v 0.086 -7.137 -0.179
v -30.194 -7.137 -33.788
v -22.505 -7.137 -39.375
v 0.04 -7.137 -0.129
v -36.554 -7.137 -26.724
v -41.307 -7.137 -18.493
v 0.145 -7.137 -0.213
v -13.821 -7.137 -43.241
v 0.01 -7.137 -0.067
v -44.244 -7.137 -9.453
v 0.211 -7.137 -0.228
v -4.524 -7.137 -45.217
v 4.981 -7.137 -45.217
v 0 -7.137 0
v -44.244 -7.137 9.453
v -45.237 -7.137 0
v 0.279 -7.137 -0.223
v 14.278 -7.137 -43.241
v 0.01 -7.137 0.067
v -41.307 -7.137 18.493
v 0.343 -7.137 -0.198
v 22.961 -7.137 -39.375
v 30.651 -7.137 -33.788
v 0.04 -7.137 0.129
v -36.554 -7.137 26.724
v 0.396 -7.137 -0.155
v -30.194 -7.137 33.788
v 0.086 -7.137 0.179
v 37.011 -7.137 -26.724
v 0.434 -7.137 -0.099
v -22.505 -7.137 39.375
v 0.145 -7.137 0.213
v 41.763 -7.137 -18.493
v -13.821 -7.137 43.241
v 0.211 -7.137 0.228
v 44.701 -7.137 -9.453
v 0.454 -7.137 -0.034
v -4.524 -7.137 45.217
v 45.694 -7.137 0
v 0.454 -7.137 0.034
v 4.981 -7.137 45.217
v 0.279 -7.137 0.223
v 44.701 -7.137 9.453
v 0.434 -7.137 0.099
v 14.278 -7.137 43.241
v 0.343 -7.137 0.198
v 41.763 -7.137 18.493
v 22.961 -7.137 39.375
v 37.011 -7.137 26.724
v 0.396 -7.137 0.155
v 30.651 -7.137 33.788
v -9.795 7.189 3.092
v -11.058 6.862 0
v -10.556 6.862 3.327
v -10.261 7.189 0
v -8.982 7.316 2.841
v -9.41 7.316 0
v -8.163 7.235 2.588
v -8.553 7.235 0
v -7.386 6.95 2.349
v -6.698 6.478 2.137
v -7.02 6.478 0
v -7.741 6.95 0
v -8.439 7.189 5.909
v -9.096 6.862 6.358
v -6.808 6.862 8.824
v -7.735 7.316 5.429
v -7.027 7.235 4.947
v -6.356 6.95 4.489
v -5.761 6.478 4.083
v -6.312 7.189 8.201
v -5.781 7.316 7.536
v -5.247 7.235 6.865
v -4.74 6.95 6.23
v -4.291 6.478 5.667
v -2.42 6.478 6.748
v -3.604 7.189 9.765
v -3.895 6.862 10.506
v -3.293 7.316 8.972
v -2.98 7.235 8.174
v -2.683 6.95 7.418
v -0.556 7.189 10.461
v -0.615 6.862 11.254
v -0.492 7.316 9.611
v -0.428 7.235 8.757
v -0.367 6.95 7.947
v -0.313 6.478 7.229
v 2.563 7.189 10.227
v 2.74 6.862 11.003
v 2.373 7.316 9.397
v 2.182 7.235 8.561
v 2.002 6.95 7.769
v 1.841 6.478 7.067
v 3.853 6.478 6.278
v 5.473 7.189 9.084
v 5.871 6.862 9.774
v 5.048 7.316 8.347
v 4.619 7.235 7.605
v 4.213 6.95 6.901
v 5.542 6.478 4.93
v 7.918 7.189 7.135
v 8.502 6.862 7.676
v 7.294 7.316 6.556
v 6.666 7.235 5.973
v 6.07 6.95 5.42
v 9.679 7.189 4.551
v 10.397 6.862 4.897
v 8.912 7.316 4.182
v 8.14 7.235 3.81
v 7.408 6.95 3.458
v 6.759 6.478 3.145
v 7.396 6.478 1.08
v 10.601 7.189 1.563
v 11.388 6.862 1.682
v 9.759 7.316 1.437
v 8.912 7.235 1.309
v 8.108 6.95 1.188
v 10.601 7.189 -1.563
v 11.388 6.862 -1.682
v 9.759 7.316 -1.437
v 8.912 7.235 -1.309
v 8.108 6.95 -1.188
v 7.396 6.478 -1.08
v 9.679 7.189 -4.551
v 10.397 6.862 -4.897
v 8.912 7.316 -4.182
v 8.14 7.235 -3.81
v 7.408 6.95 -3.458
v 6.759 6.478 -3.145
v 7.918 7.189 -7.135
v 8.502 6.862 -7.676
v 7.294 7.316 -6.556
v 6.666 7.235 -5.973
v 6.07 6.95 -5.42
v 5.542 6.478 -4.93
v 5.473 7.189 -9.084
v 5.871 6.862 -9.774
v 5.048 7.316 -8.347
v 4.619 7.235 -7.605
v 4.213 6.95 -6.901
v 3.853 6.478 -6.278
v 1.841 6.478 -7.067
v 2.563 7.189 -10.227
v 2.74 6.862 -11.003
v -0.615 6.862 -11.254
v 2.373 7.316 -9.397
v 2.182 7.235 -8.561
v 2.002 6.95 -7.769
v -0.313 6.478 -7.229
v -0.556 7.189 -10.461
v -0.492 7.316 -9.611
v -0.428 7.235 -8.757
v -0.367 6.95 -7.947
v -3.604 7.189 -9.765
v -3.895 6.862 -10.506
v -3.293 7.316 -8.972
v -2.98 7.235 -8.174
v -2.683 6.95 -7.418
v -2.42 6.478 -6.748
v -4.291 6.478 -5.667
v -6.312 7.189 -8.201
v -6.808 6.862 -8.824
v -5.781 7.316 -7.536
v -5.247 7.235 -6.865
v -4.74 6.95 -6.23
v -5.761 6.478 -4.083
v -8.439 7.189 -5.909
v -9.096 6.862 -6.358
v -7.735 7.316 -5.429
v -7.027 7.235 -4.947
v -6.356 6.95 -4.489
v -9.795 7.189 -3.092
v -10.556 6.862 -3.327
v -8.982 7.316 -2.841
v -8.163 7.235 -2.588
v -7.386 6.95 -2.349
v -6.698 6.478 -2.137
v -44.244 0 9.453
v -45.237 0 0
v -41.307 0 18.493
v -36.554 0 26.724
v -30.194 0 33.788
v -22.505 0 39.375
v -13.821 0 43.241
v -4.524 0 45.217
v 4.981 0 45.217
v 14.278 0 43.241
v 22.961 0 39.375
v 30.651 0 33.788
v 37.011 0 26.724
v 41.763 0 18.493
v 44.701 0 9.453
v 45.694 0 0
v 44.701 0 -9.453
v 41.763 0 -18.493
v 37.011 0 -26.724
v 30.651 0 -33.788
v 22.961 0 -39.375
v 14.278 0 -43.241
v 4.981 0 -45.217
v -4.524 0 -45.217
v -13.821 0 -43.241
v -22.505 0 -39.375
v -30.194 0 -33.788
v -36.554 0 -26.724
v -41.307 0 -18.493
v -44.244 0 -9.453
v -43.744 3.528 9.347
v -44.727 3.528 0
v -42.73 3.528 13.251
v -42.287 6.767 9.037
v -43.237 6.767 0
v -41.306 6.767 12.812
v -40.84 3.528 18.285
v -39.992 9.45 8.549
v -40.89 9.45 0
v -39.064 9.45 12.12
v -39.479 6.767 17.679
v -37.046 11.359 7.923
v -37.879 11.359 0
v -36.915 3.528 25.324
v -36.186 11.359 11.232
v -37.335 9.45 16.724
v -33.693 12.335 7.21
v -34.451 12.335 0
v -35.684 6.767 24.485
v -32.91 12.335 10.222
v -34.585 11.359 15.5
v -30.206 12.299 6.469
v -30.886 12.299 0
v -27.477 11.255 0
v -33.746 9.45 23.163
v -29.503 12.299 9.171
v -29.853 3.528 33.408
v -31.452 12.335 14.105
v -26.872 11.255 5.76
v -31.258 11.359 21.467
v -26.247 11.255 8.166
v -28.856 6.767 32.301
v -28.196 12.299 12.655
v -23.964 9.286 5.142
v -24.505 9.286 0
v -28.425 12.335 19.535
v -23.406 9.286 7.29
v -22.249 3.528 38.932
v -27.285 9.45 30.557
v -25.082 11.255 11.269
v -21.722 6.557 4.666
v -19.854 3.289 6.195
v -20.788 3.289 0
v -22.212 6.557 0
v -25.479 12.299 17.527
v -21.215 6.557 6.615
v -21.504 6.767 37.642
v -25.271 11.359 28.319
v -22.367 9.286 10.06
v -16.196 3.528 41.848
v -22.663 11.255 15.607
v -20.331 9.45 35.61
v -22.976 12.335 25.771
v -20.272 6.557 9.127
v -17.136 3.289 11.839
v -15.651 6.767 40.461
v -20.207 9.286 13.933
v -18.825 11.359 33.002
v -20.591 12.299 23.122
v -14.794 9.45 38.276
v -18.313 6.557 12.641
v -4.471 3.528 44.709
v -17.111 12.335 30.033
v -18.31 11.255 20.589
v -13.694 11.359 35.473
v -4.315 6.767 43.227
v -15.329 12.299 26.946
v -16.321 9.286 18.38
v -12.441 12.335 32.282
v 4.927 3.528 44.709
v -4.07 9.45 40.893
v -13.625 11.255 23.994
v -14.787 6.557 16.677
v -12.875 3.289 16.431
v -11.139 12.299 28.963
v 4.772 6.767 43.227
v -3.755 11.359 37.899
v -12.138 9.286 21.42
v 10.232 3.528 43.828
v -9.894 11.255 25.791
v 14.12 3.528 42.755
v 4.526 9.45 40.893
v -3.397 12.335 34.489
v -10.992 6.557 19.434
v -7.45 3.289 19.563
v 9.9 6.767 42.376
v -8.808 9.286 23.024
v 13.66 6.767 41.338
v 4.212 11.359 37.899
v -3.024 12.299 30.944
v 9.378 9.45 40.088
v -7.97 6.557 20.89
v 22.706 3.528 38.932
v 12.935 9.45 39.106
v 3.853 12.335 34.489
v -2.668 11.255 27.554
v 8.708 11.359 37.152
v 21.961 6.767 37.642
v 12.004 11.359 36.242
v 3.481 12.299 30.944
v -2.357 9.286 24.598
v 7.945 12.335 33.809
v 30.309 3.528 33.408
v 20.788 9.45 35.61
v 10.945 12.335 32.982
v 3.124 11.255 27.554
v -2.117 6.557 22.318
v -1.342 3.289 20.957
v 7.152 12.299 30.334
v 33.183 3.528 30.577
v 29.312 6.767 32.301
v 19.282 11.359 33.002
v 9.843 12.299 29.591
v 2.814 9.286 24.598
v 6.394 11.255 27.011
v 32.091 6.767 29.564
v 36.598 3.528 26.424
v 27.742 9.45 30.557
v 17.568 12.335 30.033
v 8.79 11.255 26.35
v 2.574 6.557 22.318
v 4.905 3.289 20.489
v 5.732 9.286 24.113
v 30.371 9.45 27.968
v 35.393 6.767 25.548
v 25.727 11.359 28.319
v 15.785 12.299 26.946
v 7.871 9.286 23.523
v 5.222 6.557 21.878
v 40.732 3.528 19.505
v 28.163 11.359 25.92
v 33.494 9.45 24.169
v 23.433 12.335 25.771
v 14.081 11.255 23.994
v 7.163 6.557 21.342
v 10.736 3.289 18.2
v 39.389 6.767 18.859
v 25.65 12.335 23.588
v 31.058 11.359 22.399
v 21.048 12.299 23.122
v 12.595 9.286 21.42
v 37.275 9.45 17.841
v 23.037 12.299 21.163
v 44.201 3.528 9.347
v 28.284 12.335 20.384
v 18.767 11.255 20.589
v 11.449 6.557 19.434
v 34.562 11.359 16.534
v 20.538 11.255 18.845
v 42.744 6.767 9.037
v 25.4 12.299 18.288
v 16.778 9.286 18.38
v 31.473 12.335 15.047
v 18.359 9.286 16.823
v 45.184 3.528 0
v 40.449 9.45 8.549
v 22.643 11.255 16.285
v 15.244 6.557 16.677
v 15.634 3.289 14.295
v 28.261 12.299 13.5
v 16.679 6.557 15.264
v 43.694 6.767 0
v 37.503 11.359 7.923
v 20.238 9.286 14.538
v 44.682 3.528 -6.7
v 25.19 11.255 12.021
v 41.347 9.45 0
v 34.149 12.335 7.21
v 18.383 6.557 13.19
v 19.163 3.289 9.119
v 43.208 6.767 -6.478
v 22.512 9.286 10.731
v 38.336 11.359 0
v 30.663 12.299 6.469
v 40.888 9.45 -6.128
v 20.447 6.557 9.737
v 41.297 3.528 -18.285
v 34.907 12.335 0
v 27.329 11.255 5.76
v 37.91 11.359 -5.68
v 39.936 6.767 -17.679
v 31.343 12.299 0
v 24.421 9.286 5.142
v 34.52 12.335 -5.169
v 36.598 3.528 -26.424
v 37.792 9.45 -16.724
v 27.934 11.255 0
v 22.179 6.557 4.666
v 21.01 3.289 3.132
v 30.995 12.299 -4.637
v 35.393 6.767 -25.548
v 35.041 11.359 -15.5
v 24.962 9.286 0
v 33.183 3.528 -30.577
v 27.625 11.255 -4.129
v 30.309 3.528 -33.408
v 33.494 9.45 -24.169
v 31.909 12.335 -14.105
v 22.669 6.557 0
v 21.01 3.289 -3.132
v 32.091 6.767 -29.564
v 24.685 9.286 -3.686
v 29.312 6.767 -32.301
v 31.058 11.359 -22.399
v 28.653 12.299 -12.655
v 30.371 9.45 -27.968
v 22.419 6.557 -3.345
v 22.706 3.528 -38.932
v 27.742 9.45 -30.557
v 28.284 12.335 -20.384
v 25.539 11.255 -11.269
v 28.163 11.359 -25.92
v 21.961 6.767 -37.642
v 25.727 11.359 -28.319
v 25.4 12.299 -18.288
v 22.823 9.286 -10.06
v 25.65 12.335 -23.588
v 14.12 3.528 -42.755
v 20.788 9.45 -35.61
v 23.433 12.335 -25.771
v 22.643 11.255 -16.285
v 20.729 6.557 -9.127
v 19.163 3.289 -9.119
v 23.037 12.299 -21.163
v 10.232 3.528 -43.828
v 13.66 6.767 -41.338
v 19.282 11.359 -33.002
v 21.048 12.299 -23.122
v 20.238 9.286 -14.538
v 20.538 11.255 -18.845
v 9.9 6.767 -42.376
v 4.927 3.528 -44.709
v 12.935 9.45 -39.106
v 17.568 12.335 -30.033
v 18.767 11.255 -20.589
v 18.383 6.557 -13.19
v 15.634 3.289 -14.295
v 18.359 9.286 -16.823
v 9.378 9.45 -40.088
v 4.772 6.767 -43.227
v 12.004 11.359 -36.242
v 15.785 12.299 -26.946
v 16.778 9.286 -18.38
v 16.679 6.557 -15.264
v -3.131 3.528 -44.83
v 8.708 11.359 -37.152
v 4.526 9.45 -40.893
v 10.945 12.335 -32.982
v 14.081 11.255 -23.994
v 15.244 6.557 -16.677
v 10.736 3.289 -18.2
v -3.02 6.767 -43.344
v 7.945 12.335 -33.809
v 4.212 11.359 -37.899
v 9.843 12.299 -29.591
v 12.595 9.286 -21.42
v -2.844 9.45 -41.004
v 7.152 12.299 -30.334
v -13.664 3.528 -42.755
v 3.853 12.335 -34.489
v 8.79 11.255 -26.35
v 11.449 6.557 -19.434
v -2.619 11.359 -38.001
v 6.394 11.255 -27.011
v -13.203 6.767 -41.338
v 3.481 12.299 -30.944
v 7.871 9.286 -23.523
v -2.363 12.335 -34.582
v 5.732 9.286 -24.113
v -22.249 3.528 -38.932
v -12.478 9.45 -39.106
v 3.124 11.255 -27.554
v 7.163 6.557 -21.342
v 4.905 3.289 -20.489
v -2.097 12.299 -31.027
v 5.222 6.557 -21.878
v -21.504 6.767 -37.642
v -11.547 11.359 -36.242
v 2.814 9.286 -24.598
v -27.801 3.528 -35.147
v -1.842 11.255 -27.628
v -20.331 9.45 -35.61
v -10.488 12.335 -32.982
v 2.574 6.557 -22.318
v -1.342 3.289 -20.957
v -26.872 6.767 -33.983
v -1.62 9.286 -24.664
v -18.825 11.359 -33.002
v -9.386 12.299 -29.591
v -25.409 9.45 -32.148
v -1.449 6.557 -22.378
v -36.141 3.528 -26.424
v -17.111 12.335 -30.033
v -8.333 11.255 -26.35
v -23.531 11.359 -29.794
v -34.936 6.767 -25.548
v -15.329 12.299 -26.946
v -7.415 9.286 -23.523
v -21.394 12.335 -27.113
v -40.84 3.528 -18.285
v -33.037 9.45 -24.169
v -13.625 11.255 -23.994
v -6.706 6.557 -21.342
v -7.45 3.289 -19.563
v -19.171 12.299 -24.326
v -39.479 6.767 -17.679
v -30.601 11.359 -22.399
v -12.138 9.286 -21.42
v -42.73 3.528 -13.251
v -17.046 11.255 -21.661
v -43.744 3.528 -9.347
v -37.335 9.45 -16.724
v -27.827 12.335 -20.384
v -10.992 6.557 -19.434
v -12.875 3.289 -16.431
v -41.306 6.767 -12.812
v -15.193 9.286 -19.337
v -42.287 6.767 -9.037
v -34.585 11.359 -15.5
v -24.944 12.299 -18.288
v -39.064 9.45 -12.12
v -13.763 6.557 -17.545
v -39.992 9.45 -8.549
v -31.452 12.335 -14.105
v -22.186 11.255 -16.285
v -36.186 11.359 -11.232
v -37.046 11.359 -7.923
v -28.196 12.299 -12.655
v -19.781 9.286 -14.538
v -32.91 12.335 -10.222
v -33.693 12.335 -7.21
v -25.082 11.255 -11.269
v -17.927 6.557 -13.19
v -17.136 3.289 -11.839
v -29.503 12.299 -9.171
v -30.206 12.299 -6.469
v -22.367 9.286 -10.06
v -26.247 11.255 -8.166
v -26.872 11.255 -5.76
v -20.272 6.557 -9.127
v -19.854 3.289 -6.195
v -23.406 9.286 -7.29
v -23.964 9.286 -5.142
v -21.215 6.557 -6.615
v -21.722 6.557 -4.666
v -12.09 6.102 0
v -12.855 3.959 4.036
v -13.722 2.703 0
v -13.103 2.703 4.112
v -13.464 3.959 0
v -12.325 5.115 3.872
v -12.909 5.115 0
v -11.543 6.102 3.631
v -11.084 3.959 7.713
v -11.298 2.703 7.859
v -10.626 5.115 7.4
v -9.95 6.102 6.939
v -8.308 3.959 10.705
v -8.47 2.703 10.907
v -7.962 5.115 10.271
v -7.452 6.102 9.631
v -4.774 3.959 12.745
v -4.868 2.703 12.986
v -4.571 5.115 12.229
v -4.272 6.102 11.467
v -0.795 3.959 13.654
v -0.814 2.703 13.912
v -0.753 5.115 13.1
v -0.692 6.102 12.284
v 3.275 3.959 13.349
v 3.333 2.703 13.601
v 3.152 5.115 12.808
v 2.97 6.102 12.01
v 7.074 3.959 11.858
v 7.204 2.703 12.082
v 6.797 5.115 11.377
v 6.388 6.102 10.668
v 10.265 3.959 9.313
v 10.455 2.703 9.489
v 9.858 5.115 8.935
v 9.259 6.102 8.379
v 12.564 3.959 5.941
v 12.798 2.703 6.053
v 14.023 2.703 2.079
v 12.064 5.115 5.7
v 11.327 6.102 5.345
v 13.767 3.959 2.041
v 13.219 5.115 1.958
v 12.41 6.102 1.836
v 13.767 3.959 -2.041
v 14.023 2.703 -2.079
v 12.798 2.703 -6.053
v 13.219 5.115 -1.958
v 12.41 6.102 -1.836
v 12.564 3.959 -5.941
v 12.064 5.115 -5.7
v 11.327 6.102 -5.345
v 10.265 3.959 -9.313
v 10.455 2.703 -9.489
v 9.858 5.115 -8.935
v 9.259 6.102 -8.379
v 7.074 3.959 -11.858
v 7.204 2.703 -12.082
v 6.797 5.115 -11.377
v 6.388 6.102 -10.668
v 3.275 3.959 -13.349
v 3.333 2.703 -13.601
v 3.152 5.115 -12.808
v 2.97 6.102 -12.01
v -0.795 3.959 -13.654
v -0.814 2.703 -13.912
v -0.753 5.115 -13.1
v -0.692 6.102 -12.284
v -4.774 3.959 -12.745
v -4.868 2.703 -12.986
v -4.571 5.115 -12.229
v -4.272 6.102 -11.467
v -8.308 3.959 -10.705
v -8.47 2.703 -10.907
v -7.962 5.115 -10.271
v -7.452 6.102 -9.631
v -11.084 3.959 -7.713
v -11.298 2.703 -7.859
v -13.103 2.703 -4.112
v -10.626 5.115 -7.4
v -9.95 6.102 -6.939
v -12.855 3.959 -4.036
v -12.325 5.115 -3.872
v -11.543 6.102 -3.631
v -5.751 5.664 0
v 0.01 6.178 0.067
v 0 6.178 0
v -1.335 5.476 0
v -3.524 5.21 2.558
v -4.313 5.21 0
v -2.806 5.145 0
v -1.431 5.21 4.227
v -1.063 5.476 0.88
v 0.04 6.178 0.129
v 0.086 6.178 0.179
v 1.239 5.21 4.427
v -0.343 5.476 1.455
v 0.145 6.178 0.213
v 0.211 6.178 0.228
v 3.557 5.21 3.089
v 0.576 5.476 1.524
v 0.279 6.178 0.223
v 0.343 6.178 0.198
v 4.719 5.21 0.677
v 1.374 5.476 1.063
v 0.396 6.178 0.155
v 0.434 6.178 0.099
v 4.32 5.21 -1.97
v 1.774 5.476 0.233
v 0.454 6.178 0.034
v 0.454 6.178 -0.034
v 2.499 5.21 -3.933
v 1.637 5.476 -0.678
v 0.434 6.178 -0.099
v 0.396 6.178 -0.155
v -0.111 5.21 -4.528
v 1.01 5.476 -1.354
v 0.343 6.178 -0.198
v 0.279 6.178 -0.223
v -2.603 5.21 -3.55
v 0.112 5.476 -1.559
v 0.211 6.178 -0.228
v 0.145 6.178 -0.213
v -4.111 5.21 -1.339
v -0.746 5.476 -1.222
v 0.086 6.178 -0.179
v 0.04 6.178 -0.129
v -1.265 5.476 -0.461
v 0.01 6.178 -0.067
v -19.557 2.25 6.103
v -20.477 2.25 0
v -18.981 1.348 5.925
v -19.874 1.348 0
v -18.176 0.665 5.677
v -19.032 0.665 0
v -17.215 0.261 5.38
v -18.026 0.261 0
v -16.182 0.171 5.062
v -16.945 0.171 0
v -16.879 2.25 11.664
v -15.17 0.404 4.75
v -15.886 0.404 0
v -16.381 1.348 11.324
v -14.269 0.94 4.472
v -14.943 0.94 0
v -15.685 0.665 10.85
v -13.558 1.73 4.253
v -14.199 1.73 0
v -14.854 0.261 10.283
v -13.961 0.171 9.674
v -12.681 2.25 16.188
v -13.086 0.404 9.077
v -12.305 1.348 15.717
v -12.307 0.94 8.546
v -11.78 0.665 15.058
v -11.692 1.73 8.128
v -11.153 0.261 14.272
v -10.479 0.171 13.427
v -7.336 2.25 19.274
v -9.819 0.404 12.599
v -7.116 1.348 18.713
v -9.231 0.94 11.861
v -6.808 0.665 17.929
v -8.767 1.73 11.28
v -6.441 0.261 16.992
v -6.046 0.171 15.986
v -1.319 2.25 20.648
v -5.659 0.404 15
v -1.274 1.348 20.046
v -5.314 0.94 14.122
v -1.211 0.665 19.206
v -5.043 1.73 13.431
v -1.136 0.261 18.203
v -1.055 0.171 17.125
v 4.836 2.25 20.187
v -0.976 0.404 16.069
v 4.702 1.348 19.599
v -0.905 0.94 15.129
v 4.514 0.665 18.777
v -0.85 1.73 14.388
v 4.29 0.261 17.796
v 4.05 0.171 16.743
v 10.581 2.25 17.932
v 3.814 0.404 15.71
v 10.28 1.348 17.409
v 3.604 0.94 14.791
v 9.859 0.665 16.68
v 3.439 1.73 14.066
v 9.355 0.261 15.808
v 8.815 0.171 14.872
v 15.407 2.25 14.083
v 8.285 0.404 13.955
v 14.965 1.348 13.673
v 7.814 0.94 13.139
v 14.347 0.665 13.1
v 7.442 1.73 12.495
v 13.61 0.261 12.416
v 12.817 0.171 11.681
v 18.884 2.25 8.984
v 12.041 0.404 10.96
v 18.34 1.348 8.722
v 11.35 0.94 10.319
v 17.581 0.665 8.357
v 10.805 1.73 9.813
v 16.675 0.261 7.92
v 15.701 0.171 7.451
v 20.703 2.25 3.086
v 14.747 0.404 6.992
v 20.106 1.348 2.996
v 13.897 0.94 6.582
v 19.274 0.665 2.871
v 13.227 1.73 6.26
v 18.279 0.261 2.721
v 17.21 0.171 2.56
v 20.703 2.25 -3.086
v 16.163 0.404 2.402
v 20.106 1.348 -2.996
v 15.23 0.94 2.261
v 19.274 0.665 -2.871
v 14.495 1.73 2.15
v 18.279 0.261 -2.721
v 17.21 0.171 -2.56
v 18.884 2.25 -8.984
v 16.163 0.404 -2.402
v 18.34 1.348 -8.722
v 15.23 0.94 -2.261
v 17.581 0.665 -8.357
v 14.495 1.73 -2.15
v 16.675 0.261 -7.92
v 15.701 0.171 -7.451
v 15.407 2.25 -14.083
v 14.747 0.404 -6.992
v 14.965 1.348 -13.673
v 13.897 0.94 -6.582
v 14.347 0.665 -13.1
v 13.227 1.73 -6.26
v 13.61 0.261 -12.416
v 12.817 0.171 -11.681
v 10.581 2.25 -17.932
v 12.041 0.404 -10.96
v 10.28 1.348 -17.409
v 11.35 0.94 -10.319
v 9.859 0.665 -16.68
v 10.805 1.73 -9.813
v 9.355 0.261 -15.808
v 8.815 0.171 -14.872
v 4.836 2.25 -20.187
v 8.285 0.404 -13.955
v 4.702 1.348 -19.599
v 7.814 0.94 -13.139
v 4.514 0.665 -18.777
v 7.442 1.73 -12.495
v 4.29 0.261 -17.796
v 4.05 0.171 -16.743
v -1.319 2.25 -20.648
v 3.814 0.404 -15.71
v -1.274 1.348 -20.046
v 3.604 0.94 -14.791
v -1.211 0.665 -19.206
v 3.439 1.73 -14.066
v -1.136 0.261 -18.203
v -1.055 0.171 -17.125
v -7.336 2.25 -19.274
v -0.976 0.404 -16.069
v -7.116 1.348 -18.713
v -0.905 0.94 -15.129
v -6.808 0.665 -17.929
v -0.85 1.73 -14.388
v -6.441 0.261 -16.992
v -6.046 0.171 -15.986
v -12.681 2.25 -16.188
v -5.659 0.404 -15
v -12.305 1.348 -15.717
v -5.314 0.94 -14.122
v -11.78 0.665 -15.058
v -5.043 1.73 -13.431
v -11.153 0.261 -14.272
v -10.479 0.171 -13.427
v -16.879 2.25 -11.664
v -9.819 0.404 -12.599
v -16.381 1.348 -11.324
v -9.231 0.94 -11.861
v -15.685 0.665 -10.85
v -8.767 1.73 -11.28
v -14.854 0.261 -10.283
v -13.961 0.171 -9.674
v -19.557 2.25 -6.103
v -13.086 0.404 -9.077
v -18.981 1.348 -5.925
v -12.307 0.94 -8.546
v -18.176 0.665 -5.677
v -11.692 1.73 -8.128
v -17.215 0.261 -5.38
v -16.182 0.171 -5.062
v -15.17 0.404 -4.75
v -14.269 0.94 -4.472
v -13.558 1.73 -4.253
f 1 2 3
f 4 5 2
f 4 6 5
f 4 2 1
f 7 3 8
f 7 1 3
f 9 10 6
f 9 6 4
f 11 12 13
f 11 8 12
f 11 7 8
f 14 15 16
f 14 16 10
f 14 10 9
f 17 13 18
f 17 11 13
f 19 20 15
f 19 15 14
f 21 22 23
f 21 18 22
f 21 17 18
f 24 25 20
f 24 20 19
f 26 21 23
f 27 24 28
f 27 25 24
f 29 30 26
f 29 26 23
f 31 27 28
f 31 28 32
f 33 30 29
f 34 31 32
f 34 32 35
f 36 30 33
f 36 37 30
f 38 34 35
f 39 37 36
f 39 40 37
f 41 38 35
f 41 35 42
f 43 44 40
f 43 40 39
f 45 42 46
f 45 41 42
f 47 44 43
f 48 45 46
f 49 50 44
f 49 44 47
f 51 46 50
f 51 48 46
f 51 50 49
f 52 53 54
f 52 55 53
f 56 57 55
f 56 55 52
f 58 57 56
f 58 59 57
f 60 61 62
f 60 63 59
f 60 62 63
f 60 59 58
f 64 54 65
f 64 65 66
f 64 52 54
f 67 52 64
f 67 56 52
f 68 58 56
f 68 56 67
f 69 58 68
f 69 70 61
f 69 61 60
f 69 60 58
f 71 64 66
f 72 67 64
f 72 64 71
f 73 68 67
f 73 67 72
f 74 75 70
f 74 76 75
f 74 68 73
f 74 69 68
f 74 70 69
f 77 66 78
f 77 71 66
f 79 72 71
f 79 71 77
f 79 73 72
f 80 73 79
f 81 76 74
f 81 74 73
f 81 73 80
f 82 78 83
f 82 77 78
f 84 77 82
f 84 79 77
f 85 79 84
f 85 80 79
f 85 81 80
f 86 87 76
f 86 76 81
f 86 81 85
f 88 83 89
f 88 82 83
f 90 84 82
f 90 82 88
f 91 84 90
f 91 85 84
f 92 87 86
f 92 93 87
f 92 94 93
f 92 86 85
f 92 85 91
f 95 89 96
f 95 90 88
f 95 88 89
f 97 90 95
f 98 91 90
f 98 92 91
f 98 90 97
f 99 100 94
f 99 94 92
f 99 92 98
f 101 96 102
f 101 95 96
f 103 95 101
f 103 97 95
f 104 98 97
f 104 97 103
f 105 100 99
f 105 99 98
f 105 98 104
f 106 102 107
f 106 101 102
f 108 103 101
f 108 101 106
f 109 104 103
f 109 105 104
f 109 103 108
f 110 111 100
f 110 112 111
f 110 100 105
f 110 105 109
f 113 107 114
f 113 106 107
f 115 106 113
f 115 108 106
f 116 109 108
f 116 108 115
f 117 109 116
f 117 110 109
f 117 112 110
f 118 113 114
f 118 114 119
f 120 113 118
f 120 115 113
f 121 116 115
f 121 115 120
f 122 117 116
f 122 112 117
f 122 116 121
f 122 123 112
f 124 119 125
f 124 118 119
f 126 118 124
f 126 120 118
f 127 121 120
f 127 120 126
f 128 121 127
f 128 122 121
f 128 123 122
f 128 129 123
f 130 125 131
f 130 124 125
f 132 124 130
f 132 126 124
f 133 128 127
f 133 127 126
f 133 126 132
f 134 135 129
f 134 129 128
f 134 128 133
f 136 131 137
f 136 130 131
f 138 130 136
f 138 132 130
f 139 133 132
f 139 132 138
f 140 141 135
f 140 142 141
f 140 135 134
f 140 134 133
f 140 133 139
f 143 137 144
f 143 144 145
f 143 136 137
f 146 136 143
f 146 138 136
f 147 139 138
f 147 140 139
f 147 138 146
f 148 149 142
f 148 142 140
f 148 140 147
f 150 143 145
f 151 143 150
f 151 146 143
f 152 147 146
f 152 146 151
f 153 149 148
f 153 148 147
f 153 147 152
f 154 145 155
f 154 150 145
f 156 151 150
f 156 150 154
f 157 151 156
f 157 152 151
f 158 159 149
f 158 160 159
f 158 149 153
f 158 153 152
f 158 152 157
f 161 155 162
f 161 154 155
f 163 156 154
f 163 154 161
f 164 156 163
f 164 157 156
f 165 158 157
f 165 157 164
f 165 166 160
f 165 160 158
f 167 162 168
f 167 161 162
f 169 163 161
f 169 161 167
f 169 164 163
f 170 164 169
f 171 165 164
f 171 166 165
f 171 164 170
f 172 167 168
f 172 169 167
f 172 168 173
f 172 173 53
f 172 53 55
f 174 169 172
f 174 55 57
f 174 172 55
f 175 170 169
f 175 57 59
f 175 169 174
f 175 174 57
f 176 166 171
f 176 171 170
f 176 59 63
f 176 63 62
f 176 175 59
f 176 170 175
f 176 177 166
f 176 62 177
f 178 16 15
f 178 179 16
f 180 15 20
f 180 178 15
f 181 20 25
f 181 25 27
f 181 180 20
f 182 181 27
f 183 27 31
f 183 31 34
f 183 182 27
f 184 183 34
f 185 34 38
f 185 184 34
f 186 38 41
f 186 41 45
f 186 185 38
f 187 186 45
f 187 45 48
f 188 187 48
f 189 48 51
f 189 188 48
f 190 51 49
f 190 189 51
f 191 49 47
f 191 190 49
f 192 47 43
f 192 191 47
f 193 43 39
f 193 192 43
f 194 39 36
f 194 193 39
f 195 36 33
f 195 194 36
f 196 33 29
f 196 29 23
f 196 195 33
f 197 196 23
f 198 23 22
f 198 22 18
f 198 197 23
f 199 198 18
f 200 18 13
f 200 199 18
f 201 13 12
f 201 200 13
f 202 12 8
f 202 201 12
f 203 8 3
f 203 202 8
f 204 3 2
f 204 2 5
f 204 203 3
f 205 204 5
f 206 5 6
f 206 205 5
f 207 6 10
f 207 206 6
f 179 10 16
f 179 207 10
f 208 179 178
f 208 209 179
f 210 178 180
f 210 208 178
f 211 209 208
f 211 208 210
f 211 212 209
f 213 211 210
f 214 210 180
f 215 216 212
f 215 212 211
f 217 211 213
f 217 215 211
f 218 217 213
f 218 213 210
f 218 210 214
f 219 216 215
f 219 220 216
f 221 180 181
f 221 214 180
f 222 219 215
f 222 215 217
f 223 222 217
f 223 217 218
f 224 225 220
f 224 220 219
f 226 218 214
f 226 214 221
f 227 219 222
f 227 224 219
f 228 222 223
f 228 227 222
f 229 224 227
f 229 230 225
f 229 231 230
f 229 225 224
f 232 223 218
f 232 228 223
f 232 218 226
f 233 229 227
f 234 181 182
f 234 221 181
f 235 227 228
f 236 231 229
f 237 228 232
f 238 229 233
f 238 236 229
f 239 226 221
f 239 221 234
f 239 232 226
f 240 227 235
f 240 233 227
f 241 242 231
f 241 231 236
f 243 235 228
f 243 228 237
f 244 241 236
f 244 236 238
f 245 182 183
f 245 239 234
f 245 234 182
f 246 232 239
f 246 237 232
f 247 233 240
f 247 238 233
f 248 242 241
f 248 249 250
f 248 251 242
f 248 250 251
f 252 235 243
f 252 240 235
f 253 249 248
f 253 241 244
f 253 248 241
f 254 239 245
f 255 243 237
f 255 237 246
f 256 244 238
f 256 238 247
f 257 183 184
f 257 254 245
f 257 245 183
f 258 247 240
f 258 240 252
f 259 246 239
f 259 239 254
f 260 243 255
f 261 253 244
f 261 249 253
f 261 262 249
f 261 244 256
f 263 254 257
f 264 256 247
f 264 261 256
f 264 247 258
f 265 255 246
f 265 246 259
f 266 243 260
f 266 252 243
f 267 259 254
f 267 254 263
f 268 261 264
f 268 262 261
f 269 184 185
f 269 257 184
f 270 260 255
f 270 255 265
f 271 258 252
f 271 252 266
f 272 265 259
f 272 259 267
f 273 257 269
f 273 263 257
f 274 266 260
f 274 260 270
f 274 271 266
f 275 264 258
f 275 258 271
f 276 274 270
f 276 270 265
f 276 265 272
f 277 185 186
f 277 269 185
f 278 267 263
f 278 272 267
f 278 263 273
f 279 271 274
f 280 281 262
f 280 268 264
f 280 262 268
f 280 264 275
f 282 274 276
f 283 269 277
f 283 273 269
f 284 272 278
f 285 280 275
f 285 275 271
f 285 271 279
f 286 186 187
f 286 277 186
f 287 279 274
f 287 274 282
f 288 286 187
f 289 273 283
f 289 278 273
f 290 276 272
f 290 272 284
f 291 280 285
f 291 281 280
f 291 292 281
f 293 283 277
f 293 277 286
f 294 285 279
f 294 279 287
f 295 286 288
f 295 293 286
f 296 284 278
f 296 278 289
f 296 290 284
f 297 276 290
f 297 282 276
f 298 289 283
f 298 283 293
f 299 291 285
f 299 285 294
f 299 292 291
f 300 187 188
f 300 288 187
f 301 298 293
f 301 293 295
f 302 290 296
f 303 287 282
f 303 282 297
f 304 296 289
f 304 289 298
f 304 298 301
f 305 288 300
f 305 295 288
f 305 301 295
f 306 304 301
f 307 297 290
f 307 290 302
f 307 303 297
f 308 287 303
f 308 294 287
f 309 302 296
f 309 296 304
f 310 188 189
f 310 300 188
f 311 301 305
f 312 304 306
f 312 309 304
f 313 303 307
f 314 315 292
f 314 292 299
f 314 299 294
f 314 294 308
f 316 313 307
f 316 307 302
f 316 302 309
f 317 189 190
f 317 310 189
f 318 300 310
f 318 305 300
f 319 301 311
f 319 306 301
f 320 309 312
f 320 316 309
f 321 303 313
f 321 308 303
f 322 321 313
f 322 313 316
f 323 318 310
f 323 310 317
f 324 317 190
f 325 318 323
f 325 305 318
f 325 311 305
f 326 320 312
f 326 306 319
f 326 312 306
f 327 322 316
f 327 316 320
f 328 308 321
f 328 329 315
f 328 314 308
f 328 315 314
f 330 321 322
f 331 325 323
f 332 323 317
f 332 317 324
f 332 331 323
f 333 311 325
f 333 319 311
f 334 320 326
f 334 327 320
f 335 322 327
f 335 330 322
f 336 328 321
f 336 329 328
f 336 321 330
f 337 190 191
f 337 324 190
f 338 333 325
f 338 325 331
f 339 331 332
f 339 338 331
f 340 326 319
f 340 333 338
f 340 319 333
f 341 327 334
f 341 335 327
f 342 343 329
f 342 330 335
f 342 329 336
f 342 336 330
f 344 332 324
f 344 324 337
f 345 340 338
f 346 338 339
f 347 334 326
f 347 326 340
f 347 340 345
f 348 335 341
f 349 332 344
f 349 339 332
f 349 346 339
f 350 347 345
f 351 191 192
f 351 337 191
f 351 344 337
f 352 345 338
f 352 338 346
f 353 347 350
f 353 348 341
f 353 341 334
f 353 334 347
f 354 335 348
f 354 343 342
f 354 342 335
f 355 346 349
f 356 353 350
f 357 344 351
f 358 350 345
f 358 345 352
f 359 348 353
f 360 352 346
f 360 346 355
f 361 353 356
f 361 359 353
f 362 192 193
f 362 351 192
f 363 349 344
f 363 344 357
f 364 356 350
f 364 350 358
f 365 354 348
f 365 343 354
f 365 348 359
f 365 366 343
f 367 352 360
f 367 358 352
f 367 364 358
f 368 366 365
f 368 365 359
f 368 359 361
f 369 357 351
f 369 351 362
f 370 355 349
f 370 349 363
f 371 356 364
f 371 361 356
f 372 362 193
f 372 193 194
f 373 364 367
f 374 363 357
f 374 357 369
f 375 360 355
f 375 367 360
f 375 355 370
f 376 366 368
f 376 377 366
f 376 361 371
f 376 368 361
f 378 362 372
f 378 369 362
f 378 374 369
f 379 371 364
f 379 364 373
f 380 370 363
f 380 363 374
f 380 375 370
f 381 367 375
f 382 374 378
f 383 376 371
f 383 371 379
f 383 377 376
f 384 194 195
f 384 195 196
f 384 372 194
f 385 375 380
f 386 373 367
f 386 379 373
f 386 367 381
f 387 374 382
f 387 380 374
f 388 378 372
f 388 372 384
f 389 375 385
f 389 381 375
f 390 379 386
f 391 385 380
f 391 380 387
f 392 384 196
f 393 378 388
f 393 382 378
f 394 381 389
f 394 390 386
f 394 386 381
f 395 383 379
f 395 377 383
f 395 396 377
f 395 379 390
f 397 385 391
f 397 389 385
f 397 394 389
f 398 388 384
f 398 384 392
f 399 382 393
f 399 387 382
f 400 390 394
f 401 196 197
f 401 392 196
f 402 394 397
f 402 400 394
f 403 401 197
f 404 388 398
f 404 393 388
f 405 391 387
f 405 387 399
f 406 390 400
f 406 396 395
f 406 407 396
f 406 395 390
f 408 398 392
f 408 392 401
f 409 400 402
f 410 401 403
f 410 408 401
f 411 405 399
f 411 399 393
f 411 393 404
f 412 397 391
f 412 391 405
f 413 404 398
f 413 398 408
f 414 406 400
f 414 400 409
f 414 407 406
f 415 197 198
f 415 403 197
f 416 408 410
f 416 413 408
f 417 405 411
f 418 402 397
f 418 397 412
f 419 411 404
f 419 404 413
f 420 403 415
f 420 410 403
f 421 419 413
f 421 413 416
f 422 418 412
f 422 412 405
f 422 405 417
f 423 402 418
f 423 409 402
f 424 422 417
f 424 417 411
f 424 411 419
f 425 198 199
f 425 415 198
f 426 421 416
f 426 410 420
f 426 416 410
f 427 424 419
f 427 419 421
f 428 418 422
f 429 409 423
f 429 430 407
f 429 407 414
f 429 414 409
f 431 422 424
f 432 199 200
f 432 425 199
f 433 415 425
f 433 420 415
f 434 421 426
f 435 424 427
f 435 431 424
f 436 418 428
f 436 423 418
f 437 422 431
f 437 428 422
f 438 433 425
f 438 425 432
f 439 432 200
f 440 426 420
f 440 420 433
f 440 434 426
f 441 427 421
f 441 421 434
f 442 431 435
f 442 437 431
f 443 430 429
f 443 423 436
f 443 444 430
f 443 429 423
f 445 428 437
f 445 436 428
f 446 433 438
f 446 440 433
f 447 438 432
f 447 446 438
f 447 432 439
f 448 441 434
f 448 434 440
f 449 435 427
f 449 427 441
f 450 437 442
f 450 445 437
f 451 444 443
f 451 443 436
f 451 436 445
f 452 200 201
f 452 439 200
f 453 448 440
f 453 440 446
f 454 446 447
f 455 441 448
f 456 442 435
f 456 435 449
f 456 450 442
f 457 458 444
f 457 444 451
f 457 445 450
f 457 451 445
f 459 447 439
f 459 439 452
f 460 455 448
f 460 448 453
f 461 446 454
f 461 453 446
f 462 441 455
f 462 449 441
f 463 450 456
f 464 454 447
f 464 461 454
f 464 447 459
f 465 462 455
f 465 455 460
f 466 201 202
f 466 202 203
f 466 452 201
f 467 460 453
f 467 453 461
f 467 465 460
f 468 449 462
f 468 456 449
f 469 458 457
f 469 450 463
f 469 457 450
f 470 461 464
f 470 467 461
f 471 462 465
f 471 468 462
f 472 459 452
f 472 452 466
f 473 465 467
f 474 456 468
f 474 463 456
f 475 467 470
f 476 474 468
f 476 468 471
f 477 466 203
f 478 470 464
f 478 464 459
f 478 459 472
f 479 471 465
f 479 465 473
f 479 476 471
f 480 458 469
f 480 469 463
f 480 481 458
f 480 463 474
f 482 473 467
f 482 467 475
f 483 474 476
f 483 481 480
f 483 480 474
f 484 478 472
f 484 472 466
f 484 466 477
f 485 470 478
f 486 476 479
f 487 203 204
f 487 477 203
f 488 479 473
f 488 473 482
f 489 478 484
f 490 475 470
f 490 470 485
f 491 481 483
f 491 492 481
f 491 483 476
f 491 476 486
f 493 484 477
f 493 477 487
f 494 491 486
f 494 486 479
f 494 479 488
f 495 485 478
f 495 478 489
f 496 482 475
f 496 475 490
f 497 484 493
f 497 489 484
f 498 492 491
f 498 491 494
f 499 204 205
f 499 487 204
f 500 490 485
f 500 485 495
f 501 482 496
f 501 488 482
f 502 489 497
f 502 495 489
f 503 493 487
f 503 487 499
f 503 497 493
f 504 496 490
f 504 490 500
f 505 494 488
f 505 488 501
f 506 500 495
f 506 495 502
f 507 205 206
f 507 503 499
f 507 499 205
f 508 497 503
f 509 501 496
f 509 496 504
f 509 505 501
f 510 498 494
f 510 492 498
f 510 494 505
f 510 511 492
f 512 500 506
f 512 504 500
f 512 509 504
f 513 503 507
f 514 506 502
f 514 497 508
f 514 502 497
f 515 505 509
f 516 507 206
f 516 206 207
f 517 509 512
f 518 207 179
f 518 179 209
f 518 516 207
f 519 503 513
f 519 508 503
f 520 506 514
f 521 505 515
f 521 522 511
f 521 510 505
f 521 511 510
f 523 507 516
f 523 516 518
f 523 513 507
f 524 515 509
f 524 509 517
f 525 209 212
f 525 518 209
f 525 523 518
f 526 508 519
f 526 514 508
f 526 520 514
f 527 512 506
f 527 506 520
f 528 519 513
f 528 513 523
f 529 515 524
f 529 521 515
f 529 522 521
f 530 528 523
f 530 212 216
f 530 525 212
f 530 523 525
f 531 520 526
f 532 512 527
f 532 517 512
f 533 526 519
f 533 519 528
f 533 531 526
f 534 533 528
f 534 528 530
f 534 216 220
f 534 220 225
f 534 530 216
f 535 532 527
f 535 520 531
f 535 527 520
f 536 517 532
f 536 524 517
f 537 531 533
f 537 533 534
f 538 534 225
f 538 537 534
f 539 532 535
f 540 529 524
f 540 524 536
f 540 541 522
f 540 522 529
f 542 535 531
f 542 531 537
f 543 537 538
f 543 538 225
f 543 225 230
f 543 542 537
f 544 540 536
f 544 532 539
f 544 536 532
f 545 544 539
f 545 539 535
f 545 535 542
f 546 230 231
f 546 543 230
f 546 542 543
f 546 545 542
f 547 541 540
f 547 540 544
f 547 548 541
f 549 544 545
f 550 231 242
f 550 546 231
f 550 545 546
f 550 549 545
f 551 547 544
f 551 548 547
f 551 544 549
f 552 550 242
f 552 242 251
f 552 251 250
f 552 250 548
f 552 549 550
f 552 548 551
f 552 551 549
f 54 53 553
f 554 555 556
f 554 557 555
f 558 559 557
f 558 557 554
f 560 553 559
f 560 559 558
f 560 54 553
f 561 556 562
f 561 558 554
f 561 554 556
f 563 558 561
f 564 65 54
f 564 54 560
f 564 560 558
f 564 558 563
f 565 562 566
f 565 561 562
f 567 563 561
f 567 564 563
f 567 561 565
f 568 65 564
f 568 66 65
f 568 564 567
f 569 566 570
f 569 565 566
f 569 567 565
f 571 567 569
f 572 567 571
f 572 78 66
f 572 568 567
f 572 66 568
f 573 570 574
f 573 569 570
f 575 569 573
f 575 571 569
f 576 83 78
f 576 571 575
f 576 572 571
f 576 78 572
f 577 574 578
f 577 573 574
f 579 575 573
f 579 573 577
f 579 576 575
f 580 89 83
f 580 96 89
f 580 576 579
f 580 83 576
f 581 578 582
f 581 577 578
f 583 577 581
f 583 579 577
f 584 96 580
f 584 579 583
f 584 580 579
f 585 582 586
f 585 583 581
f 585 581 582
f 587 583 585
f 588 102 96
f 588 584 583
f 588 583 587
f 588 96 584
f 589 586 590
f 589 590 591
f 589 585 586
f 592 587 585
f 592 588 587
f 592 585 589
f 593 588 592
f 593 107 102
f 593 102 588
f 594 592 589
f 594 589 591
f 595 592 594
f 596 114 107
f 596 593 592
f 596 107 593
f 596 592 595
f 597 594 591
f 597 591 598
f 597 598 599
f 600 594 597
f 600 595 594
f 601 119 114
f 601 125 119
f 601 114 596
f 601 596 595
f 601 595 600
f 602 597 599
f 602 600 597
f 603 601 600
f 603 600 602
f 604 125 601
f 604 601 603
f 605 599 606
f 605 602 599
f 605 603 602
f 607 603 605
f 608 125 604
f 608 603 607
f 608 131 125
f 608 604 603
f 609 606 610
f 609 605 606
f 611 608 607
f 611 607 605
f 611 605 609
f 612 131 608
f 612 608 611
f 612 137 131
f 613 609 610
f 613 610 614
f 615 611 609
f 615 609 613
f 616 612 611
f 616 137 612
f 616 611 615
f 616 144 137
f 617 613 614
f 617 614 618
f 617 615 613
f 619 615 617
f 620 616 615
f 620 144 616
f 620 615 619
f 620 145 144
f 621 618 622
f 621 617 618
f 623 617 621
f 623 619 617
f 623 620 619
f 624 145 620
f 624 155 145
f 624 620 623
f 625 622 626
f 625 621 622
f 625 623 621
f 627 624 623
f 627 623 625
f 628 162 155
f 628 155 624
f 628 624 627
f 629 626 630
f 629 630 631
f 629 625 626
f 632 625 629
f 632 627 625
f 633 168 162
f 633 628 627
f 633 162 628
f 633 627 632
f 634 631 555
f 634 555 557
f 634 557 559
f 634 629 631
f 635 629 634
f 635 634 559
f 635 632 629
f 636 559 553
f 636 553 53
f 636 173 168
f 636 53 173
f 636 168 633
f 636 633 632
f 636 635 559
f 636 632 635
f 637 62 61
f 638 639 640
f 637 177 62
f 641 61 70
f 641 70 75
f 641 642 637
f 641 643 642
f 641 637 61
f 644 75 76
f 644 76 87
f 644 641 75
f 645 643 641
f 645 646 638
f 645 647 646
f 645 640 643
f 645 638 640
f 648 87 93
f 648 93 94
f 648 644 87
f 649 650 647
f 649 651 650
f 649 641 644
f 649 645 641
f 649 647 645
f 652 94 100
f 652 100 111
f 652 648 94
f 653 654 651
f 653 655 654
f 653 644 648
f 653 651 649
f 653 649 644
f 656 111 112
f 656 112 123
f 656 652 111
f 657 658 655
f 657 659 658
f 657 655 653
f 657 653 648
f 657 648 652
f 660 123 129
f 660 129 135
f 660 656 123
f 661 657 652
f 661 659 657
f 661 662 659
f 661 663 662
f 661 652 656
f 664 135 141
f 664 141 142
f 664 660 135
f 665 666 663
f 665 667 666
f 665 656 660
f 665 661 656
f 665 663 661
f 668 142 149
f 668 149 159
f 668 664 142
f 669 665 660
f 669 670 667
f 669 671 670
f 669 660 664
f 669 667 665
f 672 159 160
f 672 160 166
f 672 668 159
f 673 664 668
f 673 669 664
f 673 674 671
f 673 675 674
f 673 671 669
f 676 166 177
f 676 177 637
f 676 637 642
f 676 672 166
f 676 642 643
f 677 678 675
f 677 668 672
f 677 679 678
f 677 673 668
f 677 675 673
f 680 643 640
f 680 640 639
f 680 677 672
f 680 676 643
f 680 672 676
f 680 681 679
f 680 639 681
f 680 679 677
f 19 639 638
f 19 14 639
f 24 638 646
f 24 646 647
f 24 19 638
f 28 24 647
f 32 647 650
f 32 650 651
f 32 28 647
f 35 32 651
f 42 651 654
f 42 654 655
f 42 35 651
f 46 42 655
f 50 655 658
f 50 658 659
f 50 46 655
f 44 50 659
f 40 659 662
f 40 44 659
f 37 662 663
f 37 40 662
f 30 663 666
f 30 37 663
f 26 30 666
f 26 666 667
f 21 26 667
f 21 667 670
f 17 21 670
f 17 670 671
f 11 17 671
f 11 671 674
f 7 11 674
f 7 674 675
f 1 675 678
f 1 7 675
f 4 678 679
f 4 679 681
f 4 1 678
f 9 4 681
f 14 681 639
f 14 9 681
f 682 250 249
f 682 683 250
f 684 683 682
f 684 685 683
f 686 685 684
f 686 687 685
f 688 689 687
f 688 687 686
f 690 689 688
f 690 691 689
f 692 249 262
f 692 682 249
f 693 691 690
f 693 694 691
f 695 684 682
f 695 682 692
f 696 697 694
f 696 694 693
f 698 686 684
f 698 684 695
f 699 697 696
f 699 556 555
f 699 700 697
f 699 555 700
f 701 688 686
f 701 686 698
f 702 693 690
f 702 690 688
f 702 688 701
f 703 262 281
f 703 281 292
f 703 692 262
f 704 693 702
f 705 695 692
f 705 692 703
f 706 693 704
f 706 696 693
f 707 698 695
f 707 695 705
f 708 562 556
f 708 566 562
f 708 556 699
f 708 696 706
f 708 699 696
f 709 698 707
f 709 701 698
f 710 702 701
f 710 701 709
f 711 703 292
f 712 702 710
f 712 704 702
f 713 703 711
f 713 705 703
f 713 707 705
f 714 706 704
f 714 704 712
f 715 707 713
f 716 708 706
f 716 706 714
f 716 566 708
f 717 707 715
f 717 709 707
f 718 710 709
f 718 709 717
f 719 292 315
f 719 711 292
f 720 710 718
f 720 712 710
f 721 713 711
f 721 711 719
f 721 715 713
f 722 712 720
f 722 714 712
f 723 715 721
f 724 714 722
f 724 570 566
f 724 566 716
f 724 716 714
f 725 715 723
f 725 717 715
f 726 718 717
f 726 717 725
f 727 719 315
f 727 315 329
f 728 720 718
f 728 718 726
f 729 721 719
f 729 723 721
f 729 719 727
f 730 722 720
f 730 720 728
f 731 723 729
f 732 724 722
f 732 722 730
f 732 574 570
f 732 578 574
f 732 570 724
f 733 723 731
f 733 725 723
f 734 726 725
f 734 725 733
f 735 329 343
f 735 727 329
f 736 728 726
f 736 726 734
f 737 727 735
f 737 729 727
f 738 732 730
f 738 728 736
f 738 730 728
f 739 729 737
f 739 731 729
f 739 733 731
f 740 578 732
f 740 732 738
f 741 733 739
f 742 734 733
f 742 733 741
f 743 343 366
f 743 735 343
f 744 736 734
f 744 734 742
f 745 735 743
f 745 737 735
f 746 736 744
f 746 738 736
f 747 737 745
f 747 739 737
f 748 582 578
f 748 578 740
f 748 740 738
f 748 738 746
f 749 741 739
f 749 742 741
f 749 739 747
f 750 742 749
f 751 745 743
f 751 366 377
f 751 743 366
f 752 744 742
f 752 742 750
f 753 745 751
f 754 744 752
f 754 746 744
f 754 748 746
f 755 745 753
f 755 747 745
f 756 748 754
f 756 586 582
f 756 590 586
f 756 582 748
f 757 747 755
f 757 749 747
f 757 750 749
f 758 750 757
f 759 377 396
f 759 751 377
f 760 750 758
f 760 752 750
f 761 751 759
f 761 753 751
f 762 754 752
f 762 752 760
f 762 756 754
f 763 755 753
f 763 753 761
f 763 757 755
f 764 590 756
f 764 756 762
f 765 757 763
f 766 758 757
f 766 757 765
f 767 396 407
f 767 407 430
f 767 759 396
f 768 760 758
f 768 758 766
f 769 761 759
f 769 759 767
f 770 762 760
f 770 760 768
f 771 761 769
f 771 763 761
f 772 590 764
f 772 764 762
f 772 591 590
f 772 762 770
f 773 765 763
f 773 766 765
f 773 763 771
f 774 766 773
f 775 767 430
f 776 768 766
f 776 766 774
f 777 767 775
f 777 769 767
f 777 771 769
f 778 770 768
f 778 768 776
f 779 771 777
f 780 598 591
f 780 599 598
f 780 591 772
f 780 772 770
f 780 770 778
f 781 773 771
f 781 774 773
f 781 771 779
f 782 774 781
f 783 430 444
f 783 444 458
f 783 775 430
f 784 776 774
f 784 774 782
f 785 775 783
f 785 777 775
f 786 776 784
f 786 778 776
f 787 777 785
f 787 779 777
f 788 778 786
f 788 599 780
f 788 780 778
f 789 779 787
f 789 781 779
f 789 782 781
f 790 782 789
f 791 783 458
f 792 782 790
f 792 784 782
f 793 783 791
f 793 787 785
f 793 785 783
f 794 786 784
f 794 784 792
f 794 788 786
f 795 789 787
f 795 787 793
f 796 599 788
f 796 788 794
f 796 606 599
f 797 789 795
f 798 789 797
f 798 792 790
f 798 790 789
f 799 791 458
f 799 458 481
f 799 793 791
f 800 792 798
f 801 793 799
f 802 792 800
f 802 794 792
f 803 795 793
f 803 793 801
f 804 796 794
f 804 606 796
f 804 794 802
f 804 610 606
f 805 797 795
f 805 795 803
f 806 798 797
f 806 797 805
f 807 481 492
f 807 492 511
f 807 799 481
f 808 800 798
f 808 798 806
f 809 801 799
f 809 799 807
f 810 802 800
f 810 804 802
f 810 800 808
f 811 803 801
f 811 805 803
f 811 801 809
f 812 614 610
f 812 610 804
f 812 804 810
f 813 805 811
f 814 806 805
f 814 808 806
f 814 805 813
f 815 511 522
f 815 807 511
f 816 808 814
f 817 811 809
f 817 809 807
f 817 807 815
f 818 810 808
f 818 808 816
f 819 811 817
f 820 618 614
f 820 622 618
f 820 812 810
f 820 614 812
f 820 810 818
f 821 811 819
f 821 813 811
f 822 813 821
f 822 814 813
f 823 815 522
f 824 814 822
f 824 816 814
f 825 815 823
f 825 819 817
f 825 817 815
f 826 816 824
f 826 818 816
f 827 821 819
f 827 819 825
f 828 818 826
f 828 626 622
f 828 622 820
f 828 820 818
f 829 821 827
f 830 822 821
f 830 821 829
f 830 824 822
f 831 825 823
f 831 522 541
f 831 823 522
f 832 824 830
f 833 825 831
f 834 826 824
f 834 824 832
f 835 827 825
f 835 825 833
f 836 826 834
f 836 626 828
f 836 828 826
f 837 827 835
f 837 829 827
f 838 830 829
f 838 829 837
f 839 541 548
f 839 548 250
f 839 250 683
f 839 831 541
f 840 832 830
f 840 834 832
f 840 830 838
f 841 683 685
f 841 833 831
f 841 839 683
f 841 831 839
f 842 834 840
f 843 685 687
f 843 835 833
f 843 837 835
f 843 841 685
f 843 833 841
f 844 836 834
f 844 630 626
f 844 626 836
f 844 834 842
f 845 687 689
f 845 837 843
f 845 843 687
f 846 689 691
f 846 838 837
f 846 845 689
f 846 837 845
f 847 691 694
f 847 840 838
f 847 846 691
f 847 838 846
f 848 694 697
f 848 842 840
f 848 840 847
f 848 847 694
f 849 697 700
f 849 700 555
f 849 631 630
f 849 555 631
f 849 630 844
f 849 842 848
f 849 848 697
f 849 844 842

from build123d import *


with BuildPart() as part:
    # Sketch2 → Revolve15 (revolve)
    with BuildSketch(Plane.XY):
        with BuildLine():
            ThreePointArc((-11.057536139, 6.861664444), (-8.978939648, 7.301650711), (-7.020479446, 6.477888049))
            ThreePointArc((-7.020479446, 6.477888049), (-3.561535652, 5.127833284), (0, 6.177787489))
            Line((0, 6.177787489), (0, -7.137400499))
            Line((0, -7.137400499), (-45.237397251, -7.137400499))
            Line((-45.237397251, -7.137400499), (-45.237397251, -4.99e-07))
            ThreePointArc((-45.237397251, -4.99e-07), (-34.450523736, 12.334918038), (-20.787740284, 3.288636819))
            ThreePointArc((-20.787740284, 3.288636819), (-17.488645172, 0.175380579), (-13.722322326, 2.703463882))
            ThreePointArc((-13.722322326, 2.703463882), (-12.908547636, 5.114921185), (-11.057536139, 6.861664444))
        make_face()
    revolve(axis=Axis((0.228383109, -0.616910329, 0), (0, 1, 0)))


solid = part.part
